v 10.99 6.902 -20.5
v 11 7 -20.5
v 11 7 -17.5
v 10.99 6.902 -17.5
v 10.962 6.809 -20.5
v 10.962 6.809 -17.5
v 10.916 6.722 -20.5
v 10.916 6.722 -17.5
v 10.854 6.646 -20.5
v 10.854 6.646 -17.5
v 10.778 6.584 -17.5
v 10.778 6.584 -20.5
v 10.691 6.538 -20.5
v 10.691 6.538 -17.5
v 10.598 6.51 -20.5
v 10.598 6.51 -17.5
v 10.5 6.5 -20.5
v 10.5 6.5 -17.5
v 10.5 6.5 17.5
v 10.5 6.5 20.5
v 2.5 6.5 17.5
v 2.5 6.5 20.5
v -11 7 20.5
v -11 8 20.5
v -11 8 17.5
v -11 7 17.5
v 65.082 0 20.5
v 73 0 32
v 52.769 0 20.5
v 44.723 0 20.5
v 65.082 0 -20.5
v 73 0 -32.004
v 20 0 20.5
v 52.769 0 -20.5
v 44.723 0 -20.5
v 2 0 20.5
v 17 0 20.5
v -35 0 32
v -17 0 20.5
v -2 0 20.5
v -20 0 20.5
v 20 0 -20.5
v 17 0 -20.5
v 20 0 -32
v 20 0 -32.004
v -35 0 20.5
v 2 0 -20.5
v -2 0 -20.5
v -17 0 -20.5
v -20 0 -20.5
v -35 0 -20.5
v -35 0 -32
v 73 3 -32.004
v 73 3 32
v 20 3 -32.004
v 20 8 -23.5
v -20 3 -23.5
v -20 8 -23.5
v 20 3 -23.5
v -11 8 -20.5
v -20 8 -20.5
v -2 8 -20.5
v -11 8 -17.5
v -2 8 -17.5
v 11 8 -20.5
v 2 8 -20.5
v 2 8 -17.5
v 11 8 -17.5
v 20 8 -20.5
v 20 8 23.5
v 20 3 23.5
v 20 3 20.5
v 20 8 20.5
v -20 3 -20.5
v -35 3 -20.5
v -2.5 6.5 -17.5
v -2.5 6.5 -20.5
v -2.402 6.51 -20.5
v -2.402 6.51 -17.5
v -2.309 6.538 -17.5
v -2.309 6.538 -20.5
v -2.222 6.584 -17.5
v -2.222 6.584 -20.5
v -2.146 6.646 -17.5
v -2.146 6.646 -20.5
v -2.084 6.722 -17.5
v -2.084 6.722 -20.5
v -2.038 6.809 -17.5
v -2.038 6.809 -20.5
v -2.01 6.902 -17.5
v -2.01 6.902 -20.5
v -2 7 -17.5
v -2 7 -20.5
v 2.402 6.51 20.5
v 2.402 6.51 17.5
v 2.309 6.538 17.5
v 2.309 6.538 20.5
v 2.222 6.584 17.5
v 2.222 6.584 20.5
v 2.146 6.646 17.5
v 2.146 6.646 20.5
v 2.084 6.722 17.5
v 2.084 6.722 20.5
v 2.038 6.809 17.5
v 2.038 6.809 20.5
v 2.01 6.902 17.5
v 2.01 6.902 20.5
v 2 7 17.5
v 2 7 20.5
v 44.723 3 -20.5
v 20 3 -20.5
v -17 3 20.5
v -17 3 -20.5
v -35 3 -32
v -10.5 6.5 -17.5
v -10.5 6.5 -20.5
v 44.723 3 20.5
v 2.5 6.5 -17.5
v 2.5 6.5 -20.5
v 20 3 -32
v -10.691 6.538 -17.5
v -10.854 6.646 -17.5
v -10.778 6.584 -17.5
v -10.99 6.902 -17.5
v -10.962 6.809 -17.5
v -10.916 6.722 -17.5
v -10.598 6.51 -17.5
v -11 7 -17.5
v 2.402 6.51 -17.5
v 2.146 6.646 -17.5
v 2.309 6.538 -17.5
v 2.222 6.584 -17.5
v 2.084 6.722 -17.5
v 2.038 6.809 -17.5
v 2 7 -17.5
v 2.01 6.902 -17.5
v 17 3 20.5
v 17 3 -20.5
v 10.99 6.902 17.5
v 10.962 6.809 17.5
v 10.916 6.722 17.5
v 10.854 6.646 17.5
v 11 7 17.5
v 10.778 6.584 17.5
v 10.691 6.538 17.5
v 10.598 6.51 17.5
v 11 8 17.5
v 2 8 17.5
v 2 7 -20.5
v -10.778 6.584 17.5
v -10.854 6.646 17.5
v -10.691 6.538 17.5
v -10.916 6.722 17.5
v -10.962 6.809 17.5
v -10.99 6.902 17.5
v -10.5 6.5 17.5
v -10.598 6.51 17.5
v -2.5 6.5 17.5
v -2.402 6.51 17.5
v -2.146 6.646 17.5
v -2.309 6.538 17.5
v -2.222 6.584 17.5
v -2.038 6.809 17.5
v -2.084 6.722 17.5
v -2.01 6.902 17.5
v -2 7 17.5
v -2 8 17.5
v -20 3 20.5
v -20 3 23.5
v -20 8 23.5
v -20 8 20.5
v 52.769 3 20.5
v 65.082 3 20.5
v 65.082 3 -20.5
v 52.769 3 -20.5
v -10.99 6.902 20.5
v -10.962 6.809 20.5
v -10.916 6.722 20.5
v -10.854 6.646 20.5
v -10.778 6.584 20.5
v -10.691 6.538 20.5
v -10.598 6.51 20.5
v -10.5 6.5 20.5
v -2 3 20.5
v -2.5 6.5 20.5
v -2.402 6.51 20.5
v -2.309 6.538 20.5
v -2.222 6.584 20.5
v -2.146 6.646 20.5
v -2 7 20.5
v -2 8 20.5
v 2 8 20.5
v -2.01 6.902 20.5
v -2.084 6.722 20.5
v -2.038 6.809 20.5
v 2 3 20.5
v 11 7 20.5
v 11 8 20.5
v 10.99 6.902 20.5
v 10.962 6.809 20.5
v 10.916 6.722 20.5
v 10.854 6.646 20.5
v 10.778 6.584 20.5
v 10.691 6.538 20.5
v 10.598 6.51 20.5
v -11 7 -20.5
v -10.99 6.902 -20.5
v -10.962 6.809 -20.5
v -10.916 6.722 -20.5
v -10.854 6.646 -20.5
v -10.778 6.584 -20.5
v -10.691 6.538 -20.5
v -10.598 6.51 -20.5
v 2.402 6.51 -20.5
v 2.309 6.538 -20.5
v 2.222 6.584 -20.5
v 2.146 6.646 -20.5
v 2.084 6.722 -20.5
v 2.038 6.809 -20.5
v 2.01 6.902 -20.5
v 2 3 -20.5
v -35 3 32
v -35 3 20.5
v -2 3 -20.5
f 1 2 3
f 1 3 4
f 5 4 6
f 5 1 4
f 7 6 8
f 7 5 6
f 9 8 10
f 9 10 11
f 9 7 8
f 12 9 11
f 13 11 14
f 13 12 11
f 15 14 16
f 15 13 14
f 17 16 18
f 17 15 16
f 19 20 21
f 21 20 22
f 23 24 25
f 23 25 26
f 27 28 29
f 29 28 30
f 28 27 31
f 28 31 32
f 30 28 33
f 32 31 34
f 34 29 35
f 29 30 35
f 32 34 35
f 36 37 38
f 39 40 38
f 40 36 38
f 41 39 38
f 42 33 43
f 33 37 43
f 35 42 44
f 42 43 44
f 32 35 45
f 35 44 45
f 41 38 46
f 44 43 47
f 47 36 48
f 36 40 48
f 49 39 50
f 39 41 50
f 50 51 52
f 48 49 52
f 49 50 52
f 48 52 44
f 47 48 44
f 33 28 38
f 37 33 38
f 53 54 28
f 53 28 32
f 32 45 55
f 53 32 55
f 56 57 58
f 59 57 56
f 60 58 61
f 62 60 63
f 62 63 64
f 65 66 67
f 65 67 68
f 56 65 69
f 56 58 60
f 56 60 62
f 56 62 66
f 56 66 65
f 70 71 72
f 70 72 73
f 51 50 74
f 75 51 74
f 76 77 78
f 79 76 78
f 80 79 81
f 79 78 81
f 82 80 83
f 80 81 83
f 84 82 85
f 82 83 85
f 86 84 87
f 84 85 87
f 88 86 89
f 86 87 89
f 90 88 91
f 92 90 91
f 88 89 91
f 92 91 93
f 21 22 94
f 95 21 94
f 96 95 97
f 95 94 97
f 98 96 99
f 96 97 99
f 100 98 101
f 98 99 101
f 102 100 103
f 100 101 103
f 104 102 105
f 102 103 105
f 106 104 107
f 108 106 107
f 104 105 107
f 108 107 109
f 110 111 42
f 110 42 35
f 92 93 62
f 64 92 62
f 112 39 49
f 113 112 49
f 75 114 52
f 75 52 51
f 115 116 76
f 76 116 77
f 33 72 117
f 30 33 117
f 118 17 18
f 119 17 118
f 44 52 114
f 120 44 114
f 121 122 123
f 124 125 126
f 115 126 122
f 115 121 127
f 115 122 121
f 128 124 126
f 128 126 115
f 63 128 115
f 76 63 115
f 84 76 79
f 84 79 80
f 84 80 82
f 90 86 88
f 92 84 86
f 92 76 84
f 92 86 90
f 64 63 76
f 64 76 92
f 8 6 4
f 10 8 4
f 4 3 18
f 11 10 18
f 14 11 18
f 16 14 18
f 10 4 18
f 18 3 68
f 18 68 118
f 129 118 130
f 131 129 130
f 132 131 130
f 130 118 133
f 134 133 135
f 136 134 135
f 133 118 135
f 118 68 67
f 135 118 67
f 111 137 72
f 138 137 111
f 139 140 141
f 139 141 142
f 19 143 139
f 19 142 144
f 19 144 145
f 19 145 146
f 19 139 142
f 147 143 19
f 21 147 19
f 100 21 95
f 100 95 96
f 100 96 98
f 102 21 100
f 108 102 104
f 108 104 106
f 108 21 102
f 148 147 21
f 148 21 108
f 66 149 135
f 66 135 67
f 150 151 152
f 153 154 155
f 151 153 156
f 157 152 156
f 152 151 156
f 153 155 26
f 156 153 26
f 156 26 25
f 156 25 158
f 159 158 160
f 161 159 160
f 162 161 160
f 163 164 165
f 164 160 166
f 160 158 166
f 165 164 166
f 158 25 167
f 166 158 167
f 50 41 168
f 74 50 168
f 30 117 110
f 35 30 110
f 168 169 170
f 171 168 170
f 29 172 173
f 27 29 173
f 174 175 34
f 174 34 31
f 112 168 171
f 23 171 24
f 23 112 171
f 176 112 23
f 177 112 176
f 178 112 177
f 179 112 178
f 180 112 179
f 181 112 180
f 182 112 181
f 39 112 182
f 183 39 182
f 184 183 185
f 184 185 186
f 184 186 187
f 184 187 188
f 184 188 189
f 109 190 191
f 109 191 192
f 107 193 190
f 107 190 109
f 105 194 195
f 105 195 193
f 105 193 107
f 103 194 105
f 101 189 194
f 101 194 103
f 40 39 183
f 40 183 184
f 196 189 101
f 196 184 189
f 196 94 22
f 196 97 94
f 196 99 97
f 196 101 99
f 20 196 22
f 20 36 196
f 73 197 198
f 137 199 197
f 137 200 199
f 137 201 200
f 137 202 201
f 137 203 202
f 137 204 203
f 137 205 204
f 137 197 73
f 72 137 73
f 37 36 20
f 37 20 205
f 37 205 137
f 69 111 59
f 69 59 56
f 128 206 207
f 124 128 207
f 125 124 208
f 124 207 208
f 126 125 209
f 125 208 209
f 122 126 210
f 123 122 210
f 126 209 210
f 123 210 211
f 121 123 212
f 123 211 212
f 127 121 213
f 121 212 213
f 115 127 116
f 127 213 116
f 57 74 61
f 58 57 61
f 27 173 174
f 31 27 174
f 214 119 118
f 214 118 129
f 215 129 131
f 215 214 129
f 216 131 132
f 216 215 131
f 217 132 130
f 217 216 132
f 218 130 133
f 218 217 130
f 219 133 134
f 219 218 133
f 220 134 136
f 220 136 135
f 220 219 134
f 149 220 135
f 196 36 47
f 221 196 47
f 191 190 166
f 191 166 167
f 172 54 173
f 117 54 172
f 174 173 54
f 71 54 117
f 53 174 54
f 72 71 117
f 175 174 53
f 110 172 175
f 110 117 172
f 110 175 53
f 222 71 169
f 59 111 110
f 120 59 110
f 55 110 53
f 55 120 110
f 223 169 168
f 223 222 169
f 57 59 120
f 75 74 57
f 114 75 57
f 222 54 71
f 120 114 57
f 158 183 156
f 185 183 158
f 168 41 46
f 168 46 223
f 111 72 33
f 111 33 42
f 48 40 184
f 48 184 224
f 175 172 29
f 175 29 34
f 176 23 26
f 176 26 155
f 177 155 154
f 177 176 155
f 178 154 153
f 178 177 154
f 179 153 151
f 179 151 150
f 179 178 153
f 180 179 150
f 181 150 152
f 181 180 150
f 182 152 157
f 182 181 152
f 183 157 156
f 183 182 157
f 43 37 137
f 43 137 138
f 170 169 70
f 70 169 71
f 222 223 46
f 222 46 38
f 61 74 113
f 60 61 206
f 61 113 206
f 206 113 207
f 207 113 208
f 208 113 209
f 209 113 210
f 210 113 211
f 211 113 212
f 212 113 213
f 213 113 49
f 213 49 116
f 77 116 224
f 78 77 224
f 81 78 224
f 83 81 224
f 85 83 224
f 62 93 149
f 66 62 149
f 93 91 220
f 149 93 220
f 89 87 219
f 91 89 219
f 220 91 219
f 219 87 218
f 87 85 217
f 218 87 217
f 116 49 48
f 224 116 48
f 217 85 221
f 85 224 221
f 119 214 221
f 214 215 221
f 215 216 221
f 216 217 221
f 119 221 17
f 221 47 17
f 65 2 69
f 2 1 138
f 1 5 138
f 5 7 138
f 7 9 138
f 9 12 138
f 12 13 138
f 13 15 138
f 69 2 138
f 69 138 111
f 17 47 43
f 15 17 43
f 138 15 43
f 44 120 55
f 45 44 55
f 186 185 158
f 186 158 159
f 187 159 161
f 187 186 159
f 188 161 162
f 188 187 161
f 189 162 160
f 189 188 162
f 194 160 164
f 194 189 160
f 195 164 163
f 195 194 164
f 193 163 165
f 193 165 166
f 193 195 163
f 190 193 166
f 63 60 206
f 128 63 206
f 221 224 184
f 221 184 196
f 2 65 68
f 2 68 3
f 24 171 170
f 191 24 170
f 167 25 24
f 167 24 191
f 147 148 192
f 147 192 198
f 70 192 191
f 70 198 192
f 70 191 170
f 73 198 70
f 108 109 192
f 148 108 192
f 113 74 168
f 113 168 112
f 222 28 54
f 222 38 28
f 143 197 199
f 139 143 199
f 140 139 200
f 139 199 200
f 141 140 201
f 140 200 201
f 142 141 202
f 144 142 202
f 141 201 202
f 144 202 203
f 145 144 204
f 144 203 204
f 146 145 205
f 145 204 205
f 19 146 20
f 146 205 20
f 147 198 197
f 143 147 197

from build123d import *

# Parameters (mm, degrees)
CROQUIS1_W              = 40
CROQUIS1_H              = 47
CROQUIS1_W_2            = 15
CROQUIS1_H_2            = 41
SALIENTE_EXTRUIR1_DEPTH = 3
CROQUIS3_W              = 40
CROQUIS3_H              = 3
SALIENTE_EXTRUIR2_DEPTH = 5
SALIENTE_EXTRUIR3_DEPTH = 3
CROQUIS6_W              = 40
CROQUIS6_H              = 3
SALIENTE_EXTRUIR4_DEPTH = 8.5
CROQUIS7_W              = 11.5
CROQUIS7_H              = 3
SALIENTE_EXTRUIR5_DEPTH = 15
CROQUIS8_W              = 64.003791446
CROQUIS8_H              = 3
SALIENTE_EXTRUIR7_DEPTH = 53
CROQUIS9_W              = 24.723137679
CROQUIS9_H              = 41
CROQUIS9_W_2            = 12.312971116
CORTAR_EXTRUIR1_DEPTH   = 53


with BuildPart() as part:
    # Croquis1 → Saliente-Extruir1 (new body)
    with BuildSketch(Plane(origin=(0, 0, 0), x_dir=(1, 0, 0), z_dir=(0, 1, 0))):
        Rectangle(CROQUIS1_W, CROQUIS1_H)
        with Locations((-9.5, 0)):
            Rectangle(CROQUIS1_W_2, CROQUIS1_H_2, mode=Mode.SUBTRACT)
        with Locations((9.5, 0)):
            Rectangle(CROQUIS1_W_2, CROQUIS1_H_2, mode=Mode.SUBTRACT)
    extrude(amount=SALIENTE_EXTRUIR1_DEPTH)

    # Croquis3 → Saliente-Extruir2 (add)
    with BuildSketch(Plane(origin=(0, 3, 0), x_dir=(1, 0, 0), z_dir=(0, 1, 0))):
        with Locations((0, 22)):
            Rectangle(CROQUIS3_W, CROQUIS3_H)
        with Locations((0, -22)):
            Rectangle(CROQUIS3_W, CROQUIS3_H)
    extrude(amount=SALIENTE_EXTRUIR2_DEPTH)

    # Croquis5 → Saliente-Extruir3 (add)
    with BuildSketch(Plane.XY.offset(-20.5)):
        with BuildLine():
            Line((-10.5, 6.5), (-2.5, 6.5))
            ThreePointArc((-2.5, 6.5), (-2.146446609, 6.646446609), (-2, 7))
            Line((-2, 7), (-2, 8))
            Line((-2, 8), (-11, 8))
            Line((-11, 8), (-11, 7))
            ThreePointArc((-11, 7), (-10.853553391, 6.646446609), (-10.5, 6.5))
        make_face()
        with BuildLine():
            Line((2, 7), (2, 8))
            Line((2, 8), (11, 8))
            Line((11, 8), (11, 7))
            ThreePointArc((11, 7), (10.853553391, 6.646446609), (10.5, 6.5))
            Line((10.5, 6.5), (2.5, 6.5))
            ThreePointArc((2.5, 6.5), (2.146446609, 6.646446609), (2, 7))
        make_face()
    saliente_extruir3 = extrude(amount=SALIENTE_EXTRUIR3_DEPTH)

    # Simetría3: Saliente-Extruir3 across plane
    add(saliente_extruir3.mirror(Plane.XY))

    # Croquis6 → Saliente-Extruir4 (add)
    with BuildSketch(Plane.XY.offset(23.5)):
        with Locations((0, 1.5)):
            Rectangle(CROQUIS6_W, CROQUIS6_H)
    saliente_extruir4 = extrude(amount=SALIENTE_EXTRUIR4_DEPTH)

    # Simetría4: Saliente-Extruir4 across plane
    add(saliente_extruir4.mirror(Plane.XY))

    # Croquis7 → Saliente-Extruir5 (add)
    with BuildSketch(Plane.ZY.offset(20)):
        with Locations((-26.25, 1.5)):
            Rectangle(CROQUIS7_W, CROQUIS7_H)
        with Locations((26.25, 1.5)):
            Rectangle(CROQUIS7_W, CROQUIS7_H)
    extrude(amount=SALIENTE_EXTRUIR5_DEPTH)

    # Croquis8 → Saliente-Extruir7 (add)
    with BuildSketch(Plane(origin=(20, 0, 0), x_dir=(0, 0, -1), z_dir=(1, 0, 0))):
        with Locations((0.001895723, 1.5)):
            Rectangle(CROQUIS8_W, CROQUIS8_H)
    extrude(amount=SALIENTE_EXTRUIR7_DEPTH)

    # Croquis9 → Cortar-Extruir1 (cut)
    with BuildSketch(Plane(origin=(0, 3, 0), x_dir=(1, 0, 0), z_dir=(0, 1, 0))):
        with Locations((32.36156884, 0)):
            Rectangle(CROQUIS9_W, CROQUIS9_H)
        with Locations((58.925723175, 0)):
            Rectangle(CROQUIS9_W_2, CROQUIS9_H)
    extrude(amount=-CORTAR_EXTRUIR1_DEPTH, mode=Mode.SUBTRACT)


solid = part.part
